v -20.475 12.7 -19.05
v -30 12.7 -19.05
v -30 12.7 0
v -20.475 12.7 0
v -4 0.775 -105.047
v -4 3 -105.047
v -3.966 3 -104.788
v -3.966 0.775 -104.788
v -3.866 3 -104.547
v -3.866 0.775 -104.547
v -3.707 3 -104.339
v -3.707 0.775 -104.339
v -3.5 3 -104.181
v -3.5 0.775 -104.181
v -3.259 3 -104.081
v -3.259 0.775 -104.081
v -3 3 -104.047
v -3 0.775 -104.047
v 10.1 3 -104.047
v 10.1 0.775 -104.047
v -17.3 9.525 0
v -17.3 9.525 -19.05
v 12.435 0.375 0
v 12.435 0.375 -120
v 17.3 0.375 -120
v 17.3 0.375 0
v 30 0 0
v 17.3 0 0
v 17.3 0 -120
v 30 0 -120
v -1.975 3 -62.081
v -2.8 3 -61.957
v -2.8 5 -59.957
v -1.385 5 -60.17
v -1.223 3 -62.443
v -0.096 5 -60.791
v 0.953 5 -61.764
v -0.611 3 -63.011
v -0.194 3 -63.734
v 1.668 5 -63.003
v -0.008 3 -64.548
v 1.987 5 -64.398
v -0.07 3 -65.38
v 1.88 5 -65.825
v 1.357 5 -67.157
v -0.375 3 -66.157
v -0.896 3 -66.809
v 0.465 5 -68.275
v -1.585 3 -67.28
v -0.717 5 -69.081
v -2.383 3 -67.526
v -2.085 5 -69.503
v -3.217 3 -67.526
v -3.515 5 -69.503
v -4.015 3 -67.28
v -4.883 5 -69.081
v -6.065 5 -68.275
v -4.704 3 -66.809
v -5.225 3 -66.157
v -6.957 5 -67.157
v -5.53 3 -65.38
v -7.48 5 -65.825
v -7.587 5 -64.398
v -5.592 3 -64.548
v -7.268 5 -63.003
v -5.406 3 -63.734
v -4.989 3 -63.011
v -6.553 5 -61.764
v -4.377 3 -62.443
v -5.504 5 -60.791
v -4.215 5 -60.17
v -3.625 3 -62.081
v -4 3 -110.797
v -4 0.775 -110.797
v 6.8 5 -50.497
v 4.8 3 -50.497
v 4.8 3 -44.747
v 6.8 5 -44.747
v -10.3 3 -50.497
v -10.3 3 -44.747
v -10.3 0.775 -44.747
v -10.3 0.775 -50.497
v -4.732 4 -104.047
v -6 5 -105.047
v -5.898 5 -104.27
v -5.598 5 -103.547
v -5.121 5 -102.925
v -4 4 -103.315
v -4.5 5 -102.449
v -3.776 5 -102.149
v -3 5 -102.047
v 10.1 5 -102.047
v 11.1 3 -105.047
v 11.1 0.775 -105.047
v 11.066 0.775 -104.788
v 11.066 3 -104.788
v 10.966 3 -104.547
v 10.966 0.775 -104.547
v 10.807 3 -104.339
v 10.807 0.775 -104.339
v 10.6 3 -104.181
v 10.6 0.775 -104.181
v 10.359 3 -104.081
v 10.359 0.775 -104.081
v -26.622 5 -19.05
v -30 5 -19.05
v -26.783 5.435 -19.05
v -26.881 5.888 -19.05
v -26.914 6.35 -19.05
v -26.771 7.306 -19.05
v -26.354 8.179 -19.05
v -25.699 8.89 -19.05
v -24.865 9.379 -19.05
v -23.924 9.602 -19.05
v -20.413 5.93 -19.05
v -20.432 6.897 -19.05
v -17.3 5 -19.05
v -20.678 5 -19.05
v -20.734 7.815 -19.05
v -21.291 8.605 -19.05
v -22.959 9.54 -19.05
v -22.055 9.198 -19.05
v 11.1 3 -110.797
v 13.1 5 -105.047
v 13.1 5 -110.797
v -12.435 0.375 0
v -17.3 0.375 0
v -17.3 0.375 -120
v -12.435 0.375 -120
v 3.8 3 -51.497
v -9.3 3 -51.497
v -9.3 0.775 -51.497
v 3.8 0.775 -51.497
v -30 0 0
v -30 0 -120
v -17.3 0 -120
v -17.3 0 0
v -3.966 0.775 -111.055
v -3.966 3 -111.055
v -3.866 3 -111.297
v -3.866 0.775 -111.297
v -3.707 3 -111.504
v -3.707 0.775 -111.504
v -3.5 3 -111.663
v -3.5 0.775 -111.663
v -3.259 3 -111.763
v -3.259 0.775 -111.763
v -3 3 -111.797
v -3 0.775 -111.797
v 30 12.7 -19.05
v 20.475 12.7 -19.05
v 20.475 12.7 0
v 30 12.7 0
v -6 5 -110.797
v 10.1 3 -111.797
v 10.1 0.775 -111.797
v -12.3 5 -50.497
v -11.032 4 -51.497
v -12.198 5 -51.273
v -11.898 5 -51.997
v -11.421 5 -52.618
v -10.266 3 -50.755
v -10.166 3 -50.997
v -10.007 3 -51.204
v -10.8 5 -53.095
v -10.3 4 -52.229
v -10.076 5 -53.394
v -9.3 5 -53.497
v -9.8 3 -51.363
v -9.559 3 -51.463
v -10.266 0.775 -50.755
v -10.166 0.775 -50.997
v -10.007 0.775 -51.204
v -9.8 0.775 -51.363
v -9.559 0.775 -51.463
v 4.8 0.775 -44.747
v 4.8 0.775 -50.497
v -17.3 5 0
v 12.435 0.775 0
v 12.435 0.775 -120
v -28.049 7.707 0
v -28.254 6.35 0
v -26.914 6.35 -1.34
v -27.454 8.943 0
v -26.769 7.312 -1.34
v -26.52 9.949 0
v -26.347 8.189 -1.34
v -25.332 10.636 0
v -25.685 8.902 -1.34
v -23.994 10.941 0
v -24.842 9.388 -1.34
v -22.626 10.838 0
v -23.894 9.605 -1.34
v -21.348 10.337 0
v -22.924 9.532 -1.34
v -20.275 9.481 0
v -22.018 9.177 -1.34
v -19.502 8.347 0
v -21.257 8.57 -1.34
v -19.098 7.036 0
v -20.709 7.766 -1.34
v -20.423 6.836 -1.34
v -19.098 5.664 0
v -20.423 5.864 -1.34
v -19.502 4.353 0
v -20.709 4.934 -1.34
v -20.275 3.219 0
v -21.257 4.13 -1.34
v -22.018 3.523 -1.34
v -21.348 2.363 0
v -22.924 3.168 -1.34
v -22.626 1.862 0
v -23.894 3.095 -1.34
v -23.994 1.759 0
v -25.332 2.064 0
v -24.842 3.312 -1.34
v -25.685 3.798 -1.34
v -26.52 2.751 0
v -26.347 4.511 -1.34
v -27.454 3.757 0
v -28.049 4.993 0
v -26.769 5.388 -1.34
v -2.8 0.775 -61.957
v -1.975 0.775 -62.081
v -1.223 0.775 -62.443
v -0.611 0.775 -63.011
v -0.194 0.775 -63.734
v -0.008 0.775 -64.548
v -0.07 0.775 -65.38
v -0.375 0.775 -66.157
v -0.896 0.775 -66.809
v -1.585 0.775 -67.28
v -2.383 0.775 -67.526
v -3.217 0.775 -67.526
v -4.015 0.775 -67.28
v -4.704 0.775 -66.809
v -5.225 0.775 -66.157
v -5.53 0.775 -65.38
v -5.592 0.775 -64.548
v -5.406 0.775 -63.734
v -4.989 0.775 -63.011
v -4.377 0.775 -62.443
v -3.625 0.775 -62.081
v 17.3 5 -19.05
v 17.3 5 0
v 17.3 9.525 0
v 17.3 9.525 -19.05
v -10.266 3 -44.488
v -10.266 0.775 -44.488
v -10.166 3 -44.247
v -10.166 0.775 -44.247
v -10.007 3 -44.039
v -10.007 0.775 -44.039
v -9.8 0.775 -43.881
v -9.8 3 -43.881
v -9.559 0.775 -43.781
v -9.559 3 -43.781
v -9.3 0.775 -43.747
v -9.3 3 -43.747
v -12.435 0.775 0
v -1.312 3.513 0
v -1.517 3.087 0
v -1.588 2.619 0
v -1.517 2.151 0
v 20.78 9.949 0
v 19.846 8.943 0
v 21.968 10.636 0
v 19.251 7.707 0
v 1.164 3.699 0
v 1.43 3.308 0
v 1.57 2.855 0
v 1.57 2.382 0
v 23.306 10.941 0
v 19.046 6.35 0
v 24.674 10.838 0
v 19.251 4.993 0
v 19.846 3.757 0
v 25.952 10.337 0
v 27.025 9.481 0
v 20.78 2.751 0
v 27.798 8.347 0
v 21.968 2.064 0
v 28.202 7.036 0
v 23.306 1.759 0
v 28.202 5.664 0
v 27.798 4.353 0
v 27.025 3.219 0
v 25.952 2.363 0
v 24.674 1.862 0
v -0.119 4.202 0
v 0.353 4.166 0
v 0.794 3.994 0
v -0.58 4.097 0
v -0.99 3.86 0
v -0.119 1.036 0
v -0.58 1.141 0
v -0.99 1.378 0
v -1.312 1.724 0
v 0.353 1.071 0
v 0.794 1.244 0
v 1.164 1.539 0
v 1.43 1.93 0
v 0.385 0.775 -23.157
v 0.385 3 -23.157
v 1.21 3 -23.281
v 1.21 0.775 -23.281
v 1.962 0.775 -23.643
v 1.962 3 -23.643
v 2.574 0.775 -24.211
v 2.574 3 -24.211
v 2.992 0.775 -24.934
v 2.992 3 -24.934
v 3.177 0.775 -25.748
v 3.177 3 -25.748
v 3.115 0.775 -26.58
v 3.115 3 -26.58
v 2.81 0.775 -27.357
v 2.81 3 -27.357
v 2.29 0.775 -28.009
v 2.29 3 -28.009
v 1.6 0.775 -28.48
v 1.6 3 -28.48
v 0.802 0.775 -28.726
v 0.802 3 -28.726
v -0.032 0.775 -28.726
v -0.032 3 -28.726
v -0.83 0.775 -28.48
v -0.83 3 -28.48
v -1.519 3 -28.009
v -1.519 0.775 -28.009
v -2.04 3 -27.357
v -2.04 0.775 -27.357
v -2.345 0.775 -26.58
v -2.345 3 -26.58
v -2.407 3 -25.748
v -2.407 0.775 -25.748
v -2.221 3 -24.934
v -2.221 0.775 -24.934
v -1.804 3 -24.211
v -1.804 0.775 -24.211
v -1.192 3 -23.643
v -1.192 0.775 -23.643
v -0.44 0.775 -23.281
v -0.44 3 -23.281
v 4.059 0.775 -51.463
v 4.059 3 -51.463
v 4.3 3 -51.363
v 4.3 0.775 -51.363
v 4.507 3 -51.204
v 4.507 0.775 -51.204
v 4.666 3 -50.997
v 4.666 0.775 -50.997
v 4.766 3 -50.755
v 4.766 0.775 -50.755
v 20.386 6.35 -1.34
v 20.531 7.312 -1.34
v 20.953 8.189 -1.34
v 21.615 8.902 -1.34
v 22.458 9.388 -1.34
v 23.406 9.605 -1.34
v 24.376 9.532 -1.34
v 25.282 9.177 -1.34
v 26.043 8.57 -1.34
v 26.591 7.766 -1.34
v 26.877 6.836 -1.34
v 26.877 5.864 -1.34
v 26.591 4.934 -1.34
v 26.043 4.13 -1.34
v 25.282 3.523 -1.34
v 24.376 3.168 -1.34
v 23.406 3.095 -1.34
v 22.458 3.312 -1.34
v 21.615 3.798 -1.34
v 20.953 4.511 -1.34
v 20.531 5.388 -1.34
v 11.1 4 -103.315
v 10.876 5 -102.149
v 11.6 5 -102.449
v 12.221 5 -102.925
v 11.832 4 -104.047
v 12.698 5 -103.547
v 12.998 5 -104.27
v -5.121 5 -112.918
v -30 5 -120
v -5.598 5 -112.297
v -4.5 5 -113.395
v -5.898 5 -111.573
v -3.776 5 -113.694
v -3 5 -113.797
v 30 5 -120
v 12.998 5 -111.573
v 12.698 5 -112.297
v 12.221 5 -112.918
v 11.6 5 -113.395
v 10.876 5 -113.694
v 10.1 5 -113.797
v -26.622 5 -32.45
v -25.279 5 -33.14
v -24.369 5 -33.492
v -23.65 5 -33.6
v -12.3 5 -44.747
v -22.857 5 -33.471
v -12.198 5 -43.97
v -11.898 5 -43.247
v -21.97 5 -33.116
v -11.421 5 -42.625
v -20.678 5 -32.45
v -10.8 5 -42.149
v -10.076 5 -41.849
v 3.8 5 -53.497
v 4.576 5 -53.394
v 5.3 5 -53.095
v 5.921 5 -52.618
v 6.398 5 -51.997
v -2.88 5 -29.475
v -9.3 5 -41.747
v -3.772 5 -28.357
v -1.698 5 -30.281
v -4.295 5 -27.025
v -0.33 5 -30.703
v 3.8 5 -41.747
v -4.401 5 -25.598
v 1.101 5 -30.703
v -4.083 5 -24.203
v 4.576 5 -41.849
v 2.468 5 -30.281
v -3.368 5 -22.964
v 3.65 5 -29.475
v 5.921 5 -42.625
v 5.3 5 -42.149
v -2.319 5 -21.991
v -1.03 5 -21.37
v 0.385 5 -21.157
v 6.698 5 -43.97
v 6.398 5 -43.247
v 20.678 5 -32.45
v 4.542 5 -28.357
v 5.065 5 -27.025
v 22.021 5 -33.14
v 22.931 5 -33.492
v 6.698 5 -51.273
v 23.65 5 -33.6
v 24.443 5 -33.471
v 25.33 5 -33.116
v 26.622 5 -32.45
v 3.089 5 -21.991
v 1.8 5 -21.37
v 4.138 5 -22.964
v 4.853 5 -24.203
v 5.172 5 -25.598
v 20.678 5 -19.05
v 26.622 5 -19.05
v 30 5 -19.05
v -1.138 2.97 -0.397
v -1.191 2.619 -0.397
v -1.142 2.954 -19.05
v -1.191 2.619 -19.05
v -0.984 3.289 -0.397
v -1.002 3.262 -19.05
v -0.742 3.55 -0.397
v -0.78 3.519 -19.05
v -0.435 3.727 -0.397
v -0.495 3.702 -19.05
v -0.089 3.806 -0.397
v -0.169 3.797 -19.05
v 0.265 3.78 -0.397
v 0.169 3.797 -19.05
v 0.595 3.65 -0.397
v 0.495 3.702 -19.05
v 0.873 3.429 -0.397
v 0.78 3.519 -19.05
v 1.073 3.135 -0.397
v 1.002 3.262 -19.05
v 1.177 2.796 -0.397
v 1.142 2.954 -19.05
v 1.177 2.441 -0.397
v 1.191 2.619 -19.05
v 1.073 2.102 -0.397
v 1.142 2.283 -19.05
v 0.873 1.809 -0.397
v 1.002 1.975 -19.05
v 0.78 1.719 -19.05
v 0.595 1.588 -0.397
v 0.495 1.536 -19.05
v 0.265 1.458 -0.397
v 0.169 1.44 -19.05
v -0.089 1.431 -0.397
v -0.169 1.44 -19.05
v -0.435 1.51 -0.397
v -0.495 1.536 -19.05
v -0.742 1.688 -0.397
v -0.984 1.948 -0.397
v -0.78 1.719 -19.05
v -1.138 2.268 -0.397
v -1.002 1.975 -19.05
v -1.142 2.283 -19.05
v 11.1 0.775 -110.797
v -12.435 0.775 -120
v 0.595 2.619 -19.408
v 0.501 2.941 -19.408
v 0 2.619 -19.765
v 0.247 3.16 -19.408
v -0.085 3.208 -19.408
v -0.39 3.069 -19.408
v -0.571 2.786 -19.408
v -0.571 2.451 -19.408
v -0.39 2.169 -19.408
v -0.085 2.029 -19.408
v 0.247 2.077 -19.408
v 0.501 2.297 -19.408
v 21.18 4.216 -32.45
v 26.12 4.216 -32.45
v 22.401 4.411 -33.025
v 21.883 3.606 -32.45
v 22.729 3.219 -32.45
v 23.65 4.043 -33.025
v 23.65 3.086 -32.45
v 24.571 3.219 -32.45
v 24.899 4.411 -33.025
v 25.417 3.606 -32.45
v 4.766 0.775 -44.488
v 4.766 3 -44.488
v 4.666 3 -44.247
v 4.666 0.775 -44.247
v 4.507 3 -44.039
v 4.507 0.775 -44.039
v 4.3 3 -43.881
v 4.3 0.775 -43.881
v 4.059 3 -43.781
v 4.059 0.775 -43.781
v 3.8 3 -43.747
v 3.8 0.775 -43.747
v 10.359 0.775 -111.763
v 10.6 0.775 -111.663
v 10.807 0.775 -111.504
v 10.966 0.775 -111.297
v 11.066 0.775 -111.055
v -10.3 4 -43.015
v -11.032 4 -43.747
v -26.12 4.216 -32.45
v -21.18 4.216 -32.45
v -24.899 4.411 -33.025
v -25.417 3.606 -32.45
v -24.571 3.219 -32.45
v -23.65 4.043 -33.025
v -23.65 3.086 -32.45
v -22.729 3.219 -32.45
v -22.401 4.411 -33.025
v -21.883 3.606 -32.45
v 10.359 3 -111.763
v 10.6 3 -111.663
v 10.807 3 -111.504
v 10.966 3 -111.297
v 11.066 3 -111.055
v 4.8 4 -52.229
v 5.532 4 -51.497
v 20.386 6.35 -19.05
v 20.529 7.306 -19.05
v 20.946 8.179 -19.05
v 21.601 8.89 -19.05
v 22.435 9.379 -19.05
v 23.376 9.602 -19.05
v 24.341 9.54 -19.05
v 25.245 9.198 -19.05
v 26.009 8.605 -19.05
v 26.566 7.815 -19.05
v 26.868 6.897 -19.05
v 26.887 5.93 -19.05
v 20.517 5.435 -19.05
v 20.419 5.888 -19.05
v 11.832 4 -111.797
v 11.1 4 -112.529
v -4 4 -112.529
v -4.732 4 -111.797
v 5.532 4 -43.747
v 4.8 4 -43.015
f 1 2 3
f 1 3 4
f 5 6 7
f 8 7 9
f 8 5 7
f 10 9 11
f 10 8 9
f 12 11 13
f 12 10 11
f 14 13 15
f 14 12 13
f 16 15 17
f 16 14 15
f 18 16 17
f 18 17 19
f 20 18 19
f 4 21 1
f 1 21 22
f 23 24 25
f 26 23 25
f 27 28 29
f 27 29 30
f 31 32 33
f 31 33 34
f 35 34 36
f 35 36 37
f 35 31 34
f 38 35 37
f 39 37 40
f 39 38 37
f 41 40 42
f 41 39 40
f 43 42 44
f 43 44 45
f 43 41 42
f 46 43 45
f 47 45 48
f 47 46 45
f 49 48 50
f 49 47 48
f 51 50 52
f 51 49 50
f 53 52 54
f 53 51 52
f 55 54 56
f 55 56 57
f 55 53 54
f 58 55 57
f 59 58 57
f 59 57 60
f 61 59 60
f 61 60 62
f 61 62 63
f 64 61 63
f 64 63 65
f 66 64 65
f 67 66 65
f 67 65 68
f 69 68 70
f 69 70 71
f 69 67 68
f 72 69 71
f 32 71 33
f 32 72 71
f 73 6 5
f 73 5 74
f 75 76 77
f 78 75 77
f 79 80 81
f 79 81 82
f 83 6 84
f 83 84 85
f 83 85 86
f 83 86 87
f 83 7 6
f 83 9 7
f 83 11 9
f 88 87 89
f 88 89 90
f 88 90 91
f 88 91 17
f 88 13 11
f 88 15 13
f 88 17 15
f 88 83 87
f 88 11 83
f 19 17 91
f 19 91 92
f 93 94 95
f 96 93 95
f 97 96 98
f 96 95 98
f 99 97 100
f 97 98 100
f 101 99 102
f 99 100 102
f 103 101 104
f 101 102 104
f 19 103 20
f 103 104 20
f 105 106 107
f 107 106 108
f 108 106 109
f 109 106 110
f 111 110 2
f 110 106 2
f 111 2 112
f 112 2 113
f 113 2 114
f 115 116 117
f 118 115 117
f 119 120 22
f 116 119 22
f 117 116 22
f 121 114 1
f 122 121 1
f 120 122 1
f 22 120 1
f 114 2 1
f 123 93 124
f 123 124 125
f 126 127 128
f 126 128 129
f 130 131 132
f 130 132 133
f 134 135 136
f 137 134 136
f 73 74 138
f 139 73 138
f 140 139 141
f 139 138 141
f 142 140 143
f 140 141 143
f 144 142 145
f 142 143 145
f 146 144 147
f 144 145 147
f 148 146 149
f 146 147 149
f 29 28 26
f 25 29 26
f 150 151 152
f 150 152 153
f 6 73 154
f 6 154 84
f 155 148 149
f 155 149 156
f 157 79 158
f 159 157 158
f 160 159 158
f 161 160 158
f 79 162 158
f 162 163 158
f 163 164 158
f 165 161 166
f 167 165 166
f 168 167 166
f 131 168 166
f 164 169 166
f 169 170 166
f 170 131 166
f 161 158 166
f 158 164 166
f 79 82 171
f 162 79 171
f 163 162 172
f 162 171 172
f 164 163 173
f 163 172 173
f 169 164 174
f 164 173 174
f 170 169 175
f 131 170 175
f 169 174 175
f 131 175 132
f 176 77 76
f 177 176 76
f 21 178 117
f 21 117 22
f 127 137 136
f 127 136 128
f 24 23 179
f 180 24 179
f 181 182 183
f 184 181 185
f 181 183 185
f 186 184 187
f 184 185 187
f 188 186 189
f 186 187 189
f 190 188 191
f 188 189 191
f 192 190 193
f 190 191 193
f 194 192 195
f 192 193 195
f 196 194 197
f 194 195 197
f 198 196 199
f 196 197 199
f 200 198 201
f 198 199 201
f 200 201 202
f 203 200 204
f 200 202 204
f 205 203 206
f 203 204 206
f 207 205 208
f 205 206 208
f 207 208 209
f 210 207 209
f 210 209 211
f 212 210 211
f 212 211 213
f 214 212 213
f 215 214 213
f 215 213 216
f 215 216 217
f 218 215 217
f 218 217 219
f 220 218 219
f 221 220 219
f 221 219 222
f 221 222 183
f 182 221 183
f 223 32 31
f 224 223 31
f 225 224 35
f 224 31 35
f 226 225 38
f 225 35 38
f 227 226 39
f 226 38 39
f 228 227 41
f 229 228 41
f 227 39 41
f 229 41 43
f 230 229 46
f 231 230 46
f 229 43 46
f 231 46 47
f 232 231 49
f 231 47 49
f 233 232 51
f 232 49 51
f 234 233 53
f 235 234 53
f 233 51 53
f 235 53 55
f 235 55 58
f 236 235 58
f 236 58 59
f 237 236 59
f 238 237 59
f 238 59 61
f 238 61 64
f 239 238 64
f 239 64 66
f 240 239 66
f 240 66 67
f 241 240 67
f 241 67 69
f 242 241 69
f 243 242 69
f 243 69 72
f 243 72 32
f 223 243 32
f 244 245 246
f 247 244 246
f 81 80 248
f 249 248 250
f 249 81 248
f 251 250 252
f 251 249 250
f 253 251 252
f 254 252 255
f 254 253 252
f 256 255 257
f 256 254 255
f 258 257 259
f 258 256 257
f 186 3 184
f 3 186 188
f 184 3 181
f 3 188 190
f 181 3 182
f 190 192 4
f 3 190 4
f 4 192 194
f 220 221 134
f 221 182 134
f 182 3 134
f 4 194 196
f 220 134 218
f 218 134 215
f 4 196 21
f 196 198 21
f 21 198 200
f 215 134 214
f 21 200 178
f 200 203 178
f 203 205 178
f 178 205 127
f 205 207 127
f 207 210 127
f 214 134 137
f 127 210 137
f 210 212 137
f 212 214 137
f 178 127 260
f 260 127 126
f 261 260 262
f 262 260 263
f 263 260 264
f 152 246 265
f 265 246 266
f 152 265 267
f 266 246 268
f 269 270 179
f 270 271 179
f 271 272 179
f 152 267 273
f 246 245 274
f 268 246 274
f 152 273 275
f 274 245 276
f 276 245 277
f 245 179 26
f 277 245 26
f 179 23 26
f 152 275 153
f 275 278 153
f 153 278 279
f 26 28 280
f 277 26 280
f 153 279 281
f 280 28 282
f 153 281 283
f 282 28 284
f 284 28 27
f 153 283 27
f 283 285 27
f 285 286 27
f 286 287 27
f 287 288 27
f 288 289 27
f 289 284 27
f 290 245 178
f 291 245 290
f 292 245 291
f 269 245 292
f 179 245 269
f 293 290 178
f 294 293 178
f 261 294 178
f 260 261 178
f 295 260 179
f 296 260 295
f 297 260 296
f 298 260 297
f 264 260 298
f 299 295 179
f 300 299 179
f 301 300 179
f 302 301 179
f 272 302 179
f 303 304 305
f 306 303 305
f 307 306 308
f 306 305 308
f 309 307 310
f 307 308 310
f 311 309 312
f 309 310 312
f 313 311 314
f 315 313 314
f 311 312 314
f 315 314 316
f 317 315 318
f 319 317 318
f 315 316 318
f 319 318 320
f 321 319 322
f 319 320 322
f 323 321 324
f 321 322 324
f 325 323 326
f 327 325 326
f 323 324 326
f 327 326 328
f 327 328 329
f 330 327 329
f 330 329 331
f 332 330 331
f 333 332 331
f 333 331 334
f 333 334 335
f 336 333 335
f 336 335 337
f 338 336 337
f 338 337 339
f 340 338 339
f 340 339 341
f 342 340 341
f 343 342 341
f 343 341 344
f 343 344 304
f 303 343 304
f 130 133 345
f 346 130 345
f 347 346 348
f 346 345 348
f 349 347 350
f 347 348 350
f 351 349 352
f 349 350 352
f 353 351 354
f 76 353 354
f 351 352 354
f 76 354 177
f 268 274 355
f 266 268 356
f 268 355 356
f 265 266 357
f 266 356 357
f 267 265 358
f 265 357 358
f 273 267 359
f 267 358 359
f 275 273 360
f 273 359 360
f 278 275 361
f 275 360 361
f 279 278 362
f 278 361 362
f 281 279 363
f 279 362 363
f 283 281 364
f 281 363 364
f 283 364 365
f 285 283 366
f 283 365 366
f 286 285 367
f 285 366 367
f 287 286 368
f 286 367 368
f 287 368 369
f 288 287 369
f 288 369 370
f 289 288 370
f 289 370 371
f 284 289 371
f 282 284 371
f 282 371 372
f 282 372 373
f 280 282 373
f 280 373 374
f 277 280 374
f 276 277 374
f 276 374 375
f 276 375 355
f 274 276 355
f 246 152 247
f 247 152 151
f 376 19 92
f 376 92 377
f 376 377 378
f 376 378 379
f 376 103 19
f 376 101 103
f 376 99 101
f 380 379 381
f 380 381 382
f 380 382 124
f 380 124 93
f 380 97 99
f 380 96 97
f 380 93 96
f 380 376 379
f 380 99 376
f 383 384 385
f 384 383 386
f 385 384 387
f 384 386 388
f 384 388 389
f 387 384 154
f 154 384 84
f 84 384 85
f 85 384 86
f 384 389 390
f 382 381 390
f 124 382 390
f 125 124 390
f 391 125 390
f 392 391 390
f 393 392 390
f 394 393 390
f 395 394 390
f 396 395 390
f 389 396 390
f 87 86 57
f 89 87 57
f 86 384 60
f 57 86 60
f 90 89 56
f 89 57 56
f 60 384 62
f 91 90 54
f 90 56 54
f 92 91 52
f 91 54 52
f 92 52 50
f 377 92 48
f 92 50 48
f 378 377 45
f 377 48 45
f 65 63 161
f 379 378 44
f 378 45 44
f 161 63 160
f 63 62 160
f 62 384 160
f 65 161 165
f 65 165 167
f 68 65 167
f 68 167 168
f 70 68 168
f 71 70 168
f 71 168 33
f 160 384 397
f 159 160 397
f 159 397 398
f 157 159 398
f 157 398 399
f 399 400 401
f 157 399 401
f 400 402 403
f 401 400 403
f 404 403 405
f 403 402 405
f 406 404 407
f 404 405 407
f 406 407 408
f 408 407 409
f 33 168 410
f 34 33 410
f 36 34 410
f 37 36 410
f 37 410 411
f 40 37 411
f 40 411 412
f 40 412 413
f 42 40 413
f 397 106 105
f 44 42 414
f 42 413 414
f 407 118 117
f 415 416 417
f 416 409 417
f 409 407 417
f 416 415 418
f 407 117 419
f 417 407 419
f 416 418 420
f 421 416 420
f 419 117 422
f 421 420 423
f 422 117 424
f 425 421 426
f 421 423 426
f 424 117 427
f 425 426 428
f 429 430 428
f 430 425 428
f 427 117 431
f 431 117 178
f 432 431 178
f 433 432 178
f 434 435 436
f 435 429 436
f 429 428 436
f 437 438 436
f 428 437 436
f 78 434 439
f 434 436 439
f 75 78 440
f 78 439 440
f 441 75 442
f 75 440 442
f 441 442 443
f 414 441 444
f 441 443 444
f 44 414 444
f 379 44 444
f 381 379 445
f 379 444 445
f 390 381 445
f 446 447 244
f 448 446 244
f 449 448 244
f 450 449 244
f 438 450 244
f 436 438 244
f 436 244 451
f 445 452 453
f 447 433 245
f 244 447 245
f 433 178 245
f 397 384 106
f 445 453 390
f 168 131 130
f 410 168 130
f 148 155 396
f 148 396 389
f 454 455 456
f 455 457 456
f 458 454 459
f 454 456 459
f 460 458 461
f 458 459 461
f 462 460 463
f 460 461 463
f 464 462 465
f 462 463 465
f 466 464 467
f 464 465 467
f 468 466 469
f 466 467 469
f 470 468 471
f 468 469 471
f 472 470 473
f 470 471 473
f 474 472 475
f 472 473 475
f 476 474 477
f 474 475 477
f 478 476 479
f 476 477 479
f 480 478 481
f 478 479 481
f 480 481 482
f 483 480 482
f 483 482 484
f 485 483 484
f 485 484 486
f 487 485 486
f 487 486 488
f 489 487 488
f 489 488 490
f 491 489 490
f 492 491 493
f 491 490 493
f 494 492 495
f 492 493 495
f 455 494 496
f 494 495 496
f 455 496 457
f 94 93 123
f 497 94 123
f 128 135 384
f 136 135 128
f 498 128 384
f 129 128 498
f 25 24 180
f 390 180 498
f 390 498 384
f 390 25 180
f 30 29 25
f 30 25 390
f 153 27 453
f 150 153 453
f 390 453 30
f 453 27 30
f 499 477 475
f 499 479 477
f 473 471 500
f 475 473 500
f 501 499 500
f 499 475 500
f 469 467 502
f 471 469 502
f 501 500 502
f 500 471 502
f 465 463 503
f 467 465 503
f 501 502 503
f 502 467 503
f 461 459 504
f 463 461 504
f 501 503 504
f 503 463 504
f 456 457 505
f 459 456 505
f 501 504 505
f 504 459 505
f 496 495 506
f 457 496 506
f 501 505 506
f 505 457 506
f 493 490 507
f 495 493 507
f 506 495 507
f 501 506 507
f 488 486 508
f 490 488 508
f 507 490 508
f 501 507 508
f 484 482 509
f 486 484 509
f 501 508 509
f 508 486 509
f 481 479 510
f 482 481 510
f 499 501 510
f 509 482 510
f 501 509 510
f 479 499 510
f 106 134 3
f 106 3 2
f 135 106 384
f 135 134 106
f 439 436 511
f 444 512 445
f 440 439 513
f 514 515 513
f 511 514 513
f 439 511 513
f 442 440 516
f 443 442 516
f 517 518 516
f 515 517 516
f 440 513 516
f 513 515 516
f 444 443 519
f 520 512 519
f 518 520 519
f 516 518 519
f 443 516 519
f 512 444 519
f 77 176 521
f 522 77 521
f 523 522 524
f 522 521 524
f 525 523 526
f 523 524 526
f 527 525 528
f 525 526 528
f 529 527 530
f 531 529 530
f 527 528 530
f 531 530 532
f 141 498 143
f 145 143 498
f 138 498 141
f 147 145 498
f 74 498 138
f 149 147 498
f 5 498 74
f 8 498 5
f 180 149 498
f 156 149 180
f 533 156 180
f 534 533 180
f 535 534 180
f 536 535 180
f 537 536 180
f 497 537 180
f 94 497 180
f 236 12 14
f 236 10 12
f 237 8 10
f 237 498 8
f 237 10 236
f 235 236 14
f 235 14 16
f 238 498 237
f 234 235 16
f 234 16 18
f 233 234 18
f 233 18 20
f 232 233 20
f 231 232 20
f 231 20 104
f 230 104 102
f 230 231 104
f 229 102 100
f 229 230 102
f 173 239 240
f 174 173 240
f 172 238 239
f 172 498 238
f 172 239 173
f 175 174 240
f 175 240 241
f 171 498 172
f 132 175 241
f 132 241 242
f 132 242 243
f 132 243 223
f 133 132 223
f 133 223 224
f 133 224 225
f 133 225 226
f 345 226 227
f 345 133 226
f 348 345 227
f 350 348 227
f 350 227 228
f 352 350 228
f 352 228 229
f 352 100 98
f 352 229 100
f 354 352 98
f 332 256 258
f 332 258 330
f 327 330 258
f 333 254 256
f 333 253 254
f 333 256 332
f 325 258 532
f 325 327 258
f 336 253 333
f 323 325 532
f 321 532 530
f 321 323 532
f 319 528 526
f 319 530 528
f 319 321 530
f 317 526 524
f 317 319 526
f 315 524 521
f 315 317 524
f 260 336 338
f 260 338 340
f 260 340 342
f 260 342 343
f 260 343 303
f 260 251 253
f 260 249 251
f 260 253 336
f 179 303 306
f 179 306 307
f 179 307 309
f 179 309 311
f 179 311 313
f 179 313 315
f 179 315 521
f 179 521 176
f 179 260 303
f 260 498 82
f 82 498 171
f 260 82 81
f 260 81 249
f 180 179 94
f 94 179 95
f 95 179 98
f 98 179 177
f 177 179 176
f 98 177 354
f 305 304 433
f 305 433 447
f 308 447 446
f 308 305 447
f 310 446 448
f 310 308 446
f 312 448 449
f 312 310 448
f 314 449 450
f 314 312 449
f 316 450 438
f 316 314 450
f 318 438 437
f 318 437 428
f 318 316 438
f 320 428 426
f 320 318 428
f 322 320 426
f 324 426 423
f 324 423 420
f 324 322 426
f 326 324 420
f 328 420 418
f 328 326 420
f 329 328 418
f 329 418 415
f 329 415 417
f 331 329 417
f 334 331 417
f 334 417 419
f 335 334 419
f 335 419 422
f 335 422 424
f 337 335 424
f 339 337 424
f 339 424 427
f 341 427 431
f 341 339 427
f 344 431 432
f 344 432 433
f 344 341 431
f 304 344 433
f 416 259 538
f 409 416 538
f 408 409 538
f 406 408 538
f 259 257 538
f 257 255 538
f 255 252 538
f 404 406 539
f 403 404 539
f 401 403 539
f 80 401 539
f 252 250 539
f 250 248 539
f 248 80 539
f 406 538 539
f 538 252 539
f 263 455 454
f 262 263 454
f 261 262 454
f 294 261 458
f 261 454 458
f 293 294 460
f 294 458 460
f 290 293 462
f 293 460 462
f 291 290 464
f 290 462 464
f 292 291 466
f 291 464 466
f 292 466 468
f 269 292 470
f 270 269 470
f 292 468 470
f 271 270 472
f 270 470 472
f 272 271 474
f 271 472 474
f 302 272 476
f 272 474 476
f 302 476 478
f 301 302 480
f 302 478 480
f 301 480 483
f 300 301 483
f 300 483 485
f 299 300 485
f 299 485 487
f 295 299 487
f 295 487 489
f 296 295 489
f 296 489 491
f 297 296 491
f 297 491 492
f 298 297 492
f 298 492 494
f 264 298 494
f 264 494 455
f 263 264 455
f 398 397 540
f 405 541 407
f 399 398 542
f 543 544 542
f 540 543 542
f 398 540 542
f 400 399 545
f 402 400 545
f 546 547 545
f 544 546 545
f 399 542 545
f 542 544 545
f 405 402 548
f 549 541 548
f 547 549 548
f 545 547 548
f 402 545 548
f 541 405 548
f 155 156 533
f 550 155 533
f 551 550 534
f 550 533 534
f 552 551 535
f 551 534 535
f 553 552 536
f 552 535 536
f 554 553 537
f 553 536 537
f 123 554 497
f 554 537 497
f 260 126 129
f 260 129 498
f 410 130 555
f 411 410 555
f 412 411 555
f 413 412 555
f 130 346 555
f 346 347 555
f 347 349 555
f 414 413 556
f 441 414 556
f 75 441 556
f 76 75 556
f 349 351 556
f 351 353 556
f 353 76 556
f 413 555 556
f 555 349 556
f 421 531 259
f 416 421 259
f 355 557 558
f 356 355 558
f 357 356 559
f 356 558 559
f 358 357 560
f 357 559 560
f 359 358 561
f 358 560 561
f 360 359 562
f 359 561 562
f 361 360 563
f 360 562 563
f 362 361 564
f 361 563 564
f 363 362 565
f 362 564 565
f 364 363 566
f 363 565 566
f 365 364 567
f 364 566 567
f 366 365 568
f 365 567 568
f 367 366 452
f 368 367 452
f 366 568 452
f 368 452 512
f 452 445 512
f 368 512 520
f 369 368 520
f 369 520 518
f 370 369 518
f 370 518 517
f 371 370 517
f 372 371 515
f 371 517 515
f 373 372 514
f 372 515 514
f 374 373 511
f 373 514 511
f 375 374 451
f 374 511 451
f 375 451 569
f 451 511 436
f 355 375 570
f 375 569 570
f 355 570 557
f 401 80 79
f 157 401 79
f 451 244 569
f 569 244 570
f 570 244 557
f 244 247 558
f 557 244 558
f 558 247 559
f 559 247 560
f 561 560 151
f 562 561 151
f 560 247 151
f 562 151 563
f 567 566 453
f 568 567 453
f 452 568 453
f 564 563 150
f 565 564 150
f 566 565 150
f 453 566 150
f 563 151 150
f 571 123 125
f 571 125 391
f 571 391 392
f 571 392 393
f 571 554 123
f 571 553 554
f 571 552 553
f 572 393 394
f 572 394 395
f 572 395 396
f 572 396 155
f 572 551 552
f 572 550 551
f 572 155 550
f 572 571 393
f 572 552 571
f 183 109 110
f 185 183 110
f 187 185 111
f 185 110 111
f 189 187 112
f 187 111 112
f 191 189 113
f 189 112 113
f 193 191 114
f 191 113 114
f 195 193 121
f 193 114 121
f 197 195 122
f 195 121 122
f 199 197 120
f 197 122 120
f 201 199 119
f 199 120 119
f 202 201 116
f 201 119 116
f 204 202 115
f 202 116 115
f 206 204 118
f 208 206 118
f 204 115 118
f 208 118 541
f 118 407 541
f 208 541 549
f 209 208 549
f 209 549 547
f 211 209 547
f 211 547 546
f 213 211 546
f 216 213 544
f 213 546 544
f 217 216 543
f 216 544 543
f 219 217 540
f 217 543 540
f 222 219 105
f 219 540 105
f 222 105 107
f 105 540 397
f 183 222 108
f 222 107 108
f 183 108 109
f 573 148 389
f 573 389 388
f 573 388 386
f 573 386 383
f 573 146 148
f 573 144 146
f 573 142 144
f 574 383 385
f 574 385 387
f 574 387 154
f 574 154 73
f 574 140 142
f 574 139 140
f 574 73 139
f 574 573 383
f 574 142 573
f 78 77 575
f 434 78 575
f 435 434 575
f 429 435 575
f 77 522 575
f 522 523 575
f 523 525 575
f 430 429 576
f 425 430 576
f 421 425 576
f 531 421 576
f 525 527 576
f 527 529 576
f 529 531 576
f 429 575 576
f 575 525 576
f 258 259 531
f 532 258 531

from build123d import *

# Parameters (mm, degrees)
SKETCH1_W                                 = 60
SKETCH1_H                                 = 120
BOSS_EXTRUDE1_DEPTH                       = 12.7
SKETCH2_W                                 = 34.6
SKETCH2_H                                 = 7.7
CUT_EXTRUDE1_DEPTH                        = 121
F_3_32_0_09375_DIAMETER_HOLE1_D           = 2.38125
F_3_32_0_09375_DIAMETER_HOLE1_DEPTH       = 19.05
F_3_32_0_09375_DIAMETER_HOLE1_CSINK_D     = 3.175
F_3_32_0_09375_DIAMETER_HOLE1_CSINK_ANGLE = 90
F_3_32_0_09375_DIAMETER_HOLE1_TIP         = 0.715399675
CUT_EXTRUDE2_DEPTH                        = 1
CUT_EXTRUDE2_DEPTH_BACK                   = 121
F_5_16_18_TAPPED_HOLE1_D                  = 6.5278
F_5_16_18_TAPPED_HOLE1_DEPTH              = 32.45
F_5_16_18_TAPPED_HOLE1_CSINK_D            = 9.2075
F_5_16_18_TAPPED_HOLE1_CSINK_ANGLE        = 90
F_5_16_18_TAPPED_HOLE1_TIP                = 1.961148974
CHAMFER1_SIZE                             = 3.175
SKETCH6_W                                 = 15.1
SKETCH6_H                                 = 7.75
CUT_EXTRUDE3_DEPTH                        = 6
FILLET1_R                                 = 1
SKETCH7_R                                 = 2.8
CUT_EXTRUDE4_DEPTH                        = 6.0000001
CHAMFER2_SIZE                             = 2
SKETCH10_W                                = 60
SKETCH10_H                                = 100.95
CUT_EXTRUDE5_DEPTH                        = 7.7
SKETCH12_W                                = 24.87086649
SKETCH12_H                                = 0.4
CUT_EXTRUDE11_DEPTH                       = 121.0000001
SKETCH13_W                                = 34.6
SKETCH13_H                                = 0.374910819
CUT_EXTRUDE12_DEPTH                       = 121


with BuildPart() as part:
    # Sketch1 → Boss-Extrude1 (new body)
    with BuildSketch(Plane(origin=(0, 0, 0), x_dir=(1, 0, 0), z_dir=(0, 1, 0))):
        with Locations((0, 60)):
            Rectangle(SKETCH1_W, SKETCH1_H)
    extrude(amount=BOSS_EXTRUDE1_DEPTH)

    # Sketch2 → Cut-Extrude1 (cut, through all)
    with BuildSketch(Plane.XY):
        with Locations((0, 8.85)):
            Rectangle(SKETCH2_W, SKETCH2_H)
    extrude(amount=-CUT_EXTRUDE1_DEPTH, mode=Mode.SUBTRACT)

    # 3_32 _0.09375_ Diameter Hole1
    with Locations(Plane.XY):
        with Locations((0, 2.61875)):
            CounterSinkHole(F_3_32_0_09375_DIAMETER_HOLE1_D / 2, F_3_32_0_09375_DIAMETER_HOLE1_CSINK_D / 2, depth=F_3_32_0_09375_DIAMETER_HOLE1_DEPTH, counter_sink_angle=F_3_32_0_09375_DIAMETER_HOLE1_CSINK_ANGLE)
            with Locations((0, 0, -(F_3_32_0_09375_DIAMETER_HOLE1_DEPTH + F_3_32_0_09375_DIAMETER_HOLE1_TIP / 2))):  # 118° drill point
                Cone(0, F_3_32_0_09375_DIAMETER_HOLE1_D / 2, F_3_32_0_09375_DIAMETER_HOLE1_TIP, mode=Mode.SUBTRACT)

    # Sketch3 → Cut-Extrude2 (cut, two sides)
    with BuildSketch(Plane.XY) as cut_extrude2_sk:
        with BuildLine():
            Line((-124.818289263, -9.651397294), (-17.3, 0))
            ThreePointArc((-17.3, 0), (0, 0.774910819), (17.3, 0))
            Line((17.3, 0), (124.818289263, -9.651397294))
            Line((124.818289263, -9.651397294), (124.818289263, -225.552596882))
            Line((124.818289263, -225.552596882), (-124.818289263, -225.552596882))
            Line((-124.818289263, -225.552596882), (-124.818289263, -9.651397294))
        make_face()
    extrude(amount=CUT_EXTRUDE2_DEPTH, mode=Mode.SUBTRACT)
    extrude(cut_extrude2_sk.sketch, amount=-CUT_EXTRUDE2_DEPTH_BACK, mode=Mode.SUBTRACT)

    # 5_16-18 Tapped Hole1
    with Locations(Plane.XY):
        with Locations((-23.65, 6.35), (23.65, 6.35)):
            CounterSinkHole(F_5_16_18_TAPPED_HOLE1_D / 2, F_5_16_18_TAPPED_HOLE1_CSINK_D / 2, depth=F_5_16_18_TAPPED_HOLE1_DEPTH, counter_sink_angle=F_5_16_18_TAPPED_HOLE1_CSINK_ANGLE)
            with Locations((0, 0, -(F_5_16_18_TAPPED_HOLE1_DEPTH + F_5_16_18_TAPPED_HOLE1_TIP / 2))):  # 118° drill point
                Cone(0, F_5_16_18_TAPPED_HOLE1_D / 2, F_5_16_18_TAPPED_HOLE1_TIP, mode=Mode.SUBTRACT)

    # Chamfer1
    chamfer1_edges = [part.edges().sort_by_distance(p)[0] for p in [
        (-17.3, 12.7, -60),
        (17.3, 12.7, -60),
    ]]
    chamfer(chamfer1_edges, length=CHAMFER1_SIZE)

    # Sketch6 → Cut-Extrude3 (cut, through all)
    with BuildSketch(Plane(origin=(0, 5, 0), x_dir=(1, 0, 0), z_dir=(0, 1, 0))):
        with Locations((3.55, 107.9216)):
            Rectangle(SKETCH6_W, SKETCH6_H)
        with Locations((-2.75, 47.6216)):
            Rectangle(SKETCH6_W, SKETCH6_H)
    extrude(amount=-CUT_EXTRUDE3_DEPTH, mode=Mode.SUBTRACT)

    # Fillet1
    fillet1_edges = [part.edges().sort_by_distance(p)[0] for p in [
        (11.1, 2.72813819, -111.7966),
        (11.1, 2.72813819, -104.0466),
        (-4, 2.866781366, -104.0466),
        (-4, 2.866781366, -111.7966),
        (4.8, 2.857683387, -51.4966),
        (4.8, 2.857683387, -43.7466),
        (-10.3, 2.750290995, -43.7466),
        (-10.3, 2.750290995, -51.4966),
    ]]
    fillet(fillet1_edges, radius=FILLET1_R)

    # Sketch7 → Cut-Extrude4 (cut, through all)
    with BuildSketch(Plane(origin=(0, 5, 0), x_dir=(1, 0, 0), z_dir=(0, 1, 0))):
        with Locations(Location((-2.8, 64.7568, 0), (0, 0, 270))):  # turned: the seam where the file's is
            Circle(SKETCH7_R)
        with Locations(Location((0.3851, 25.9568, 0), (0, 0, 270))):  # turned: the seam where the file's is
            Circle(SKETCH7_R)
    extrude(amount=-CUT_EXTRUDE4_DEPTH, mode=Mode.SUBTRACT)

    # Chamfer2
    chamfer2_edges = [part.edges().sort_by_distance(p)[0] for p in [
        (3.55, 5, -104.0466),
        (-4, 5, -107.9216),
        (11.1, 5, -107.9216),
        (3.55, 5, -111.7966),
        (-2.75, 5, -51.4966),
        (4.8, 5, -47.6216),
        (-2.75, 5, -43.7466),
        (-10.3, 5, -47.6216),
        (-3.707106781, 5, -104.339493219),
        (10.807106781, 5, -104.339493219),
        (10.807106781, 5, -111.503706781),
        (4.507106781, 5, -51.203706781),
        (4.507106781, 5, -44.039493219),
        (-10.007106781, 5, -44.039493219),
        (-10.007106781, 5, -51.203706781),
        (-3.707106781, 5, -111.503706781),
        (-2.8, 5, -67.5568),
        (0.3851, 5, -28.7568),
    ]]
    chamfer(chamfer2_edges, length=CHAMFER2_SIZE)

    # Sketch10 → Cut-Extrude5 (cut)
    with BuildSketch(Plane(origin=(0, 12.7, 0), x_dir=(1, 0, 0), z_dir=(0, 1, 0))):
        with Locations((0, 69.525)):
            Rectangle(SKETCH10_W, SKETCH10_H)
    extrude(amount=-CUT_EXTRUDE5_DEPTH, mode=Mode.SUBTRACT)

    # Sketch12 → Cut-Extrude11 (cut, through all)
    with BuildSketch(Plane.XY):
        with Locations((0, 0.574910819)):
            Rectangle(SKETCH12_W, SKETCH12_H)
    extrude(amount=-CUT_EXTRUDE11_DEPTH, mode=Mode.SUBTRACT)

    # Sketch13 → Cut-Extrude12 (cut, through all)
    with BuildSketch(Plane.XY):
        with Locations((0, 0.18745541)):
            Rectangle(SKETCH13_W, SKETCH13_H)
    extrude(amount=-CUT_EXTRUDE12_DEPTH, mode=Mode.SUBTRACT)


solid = part.part
